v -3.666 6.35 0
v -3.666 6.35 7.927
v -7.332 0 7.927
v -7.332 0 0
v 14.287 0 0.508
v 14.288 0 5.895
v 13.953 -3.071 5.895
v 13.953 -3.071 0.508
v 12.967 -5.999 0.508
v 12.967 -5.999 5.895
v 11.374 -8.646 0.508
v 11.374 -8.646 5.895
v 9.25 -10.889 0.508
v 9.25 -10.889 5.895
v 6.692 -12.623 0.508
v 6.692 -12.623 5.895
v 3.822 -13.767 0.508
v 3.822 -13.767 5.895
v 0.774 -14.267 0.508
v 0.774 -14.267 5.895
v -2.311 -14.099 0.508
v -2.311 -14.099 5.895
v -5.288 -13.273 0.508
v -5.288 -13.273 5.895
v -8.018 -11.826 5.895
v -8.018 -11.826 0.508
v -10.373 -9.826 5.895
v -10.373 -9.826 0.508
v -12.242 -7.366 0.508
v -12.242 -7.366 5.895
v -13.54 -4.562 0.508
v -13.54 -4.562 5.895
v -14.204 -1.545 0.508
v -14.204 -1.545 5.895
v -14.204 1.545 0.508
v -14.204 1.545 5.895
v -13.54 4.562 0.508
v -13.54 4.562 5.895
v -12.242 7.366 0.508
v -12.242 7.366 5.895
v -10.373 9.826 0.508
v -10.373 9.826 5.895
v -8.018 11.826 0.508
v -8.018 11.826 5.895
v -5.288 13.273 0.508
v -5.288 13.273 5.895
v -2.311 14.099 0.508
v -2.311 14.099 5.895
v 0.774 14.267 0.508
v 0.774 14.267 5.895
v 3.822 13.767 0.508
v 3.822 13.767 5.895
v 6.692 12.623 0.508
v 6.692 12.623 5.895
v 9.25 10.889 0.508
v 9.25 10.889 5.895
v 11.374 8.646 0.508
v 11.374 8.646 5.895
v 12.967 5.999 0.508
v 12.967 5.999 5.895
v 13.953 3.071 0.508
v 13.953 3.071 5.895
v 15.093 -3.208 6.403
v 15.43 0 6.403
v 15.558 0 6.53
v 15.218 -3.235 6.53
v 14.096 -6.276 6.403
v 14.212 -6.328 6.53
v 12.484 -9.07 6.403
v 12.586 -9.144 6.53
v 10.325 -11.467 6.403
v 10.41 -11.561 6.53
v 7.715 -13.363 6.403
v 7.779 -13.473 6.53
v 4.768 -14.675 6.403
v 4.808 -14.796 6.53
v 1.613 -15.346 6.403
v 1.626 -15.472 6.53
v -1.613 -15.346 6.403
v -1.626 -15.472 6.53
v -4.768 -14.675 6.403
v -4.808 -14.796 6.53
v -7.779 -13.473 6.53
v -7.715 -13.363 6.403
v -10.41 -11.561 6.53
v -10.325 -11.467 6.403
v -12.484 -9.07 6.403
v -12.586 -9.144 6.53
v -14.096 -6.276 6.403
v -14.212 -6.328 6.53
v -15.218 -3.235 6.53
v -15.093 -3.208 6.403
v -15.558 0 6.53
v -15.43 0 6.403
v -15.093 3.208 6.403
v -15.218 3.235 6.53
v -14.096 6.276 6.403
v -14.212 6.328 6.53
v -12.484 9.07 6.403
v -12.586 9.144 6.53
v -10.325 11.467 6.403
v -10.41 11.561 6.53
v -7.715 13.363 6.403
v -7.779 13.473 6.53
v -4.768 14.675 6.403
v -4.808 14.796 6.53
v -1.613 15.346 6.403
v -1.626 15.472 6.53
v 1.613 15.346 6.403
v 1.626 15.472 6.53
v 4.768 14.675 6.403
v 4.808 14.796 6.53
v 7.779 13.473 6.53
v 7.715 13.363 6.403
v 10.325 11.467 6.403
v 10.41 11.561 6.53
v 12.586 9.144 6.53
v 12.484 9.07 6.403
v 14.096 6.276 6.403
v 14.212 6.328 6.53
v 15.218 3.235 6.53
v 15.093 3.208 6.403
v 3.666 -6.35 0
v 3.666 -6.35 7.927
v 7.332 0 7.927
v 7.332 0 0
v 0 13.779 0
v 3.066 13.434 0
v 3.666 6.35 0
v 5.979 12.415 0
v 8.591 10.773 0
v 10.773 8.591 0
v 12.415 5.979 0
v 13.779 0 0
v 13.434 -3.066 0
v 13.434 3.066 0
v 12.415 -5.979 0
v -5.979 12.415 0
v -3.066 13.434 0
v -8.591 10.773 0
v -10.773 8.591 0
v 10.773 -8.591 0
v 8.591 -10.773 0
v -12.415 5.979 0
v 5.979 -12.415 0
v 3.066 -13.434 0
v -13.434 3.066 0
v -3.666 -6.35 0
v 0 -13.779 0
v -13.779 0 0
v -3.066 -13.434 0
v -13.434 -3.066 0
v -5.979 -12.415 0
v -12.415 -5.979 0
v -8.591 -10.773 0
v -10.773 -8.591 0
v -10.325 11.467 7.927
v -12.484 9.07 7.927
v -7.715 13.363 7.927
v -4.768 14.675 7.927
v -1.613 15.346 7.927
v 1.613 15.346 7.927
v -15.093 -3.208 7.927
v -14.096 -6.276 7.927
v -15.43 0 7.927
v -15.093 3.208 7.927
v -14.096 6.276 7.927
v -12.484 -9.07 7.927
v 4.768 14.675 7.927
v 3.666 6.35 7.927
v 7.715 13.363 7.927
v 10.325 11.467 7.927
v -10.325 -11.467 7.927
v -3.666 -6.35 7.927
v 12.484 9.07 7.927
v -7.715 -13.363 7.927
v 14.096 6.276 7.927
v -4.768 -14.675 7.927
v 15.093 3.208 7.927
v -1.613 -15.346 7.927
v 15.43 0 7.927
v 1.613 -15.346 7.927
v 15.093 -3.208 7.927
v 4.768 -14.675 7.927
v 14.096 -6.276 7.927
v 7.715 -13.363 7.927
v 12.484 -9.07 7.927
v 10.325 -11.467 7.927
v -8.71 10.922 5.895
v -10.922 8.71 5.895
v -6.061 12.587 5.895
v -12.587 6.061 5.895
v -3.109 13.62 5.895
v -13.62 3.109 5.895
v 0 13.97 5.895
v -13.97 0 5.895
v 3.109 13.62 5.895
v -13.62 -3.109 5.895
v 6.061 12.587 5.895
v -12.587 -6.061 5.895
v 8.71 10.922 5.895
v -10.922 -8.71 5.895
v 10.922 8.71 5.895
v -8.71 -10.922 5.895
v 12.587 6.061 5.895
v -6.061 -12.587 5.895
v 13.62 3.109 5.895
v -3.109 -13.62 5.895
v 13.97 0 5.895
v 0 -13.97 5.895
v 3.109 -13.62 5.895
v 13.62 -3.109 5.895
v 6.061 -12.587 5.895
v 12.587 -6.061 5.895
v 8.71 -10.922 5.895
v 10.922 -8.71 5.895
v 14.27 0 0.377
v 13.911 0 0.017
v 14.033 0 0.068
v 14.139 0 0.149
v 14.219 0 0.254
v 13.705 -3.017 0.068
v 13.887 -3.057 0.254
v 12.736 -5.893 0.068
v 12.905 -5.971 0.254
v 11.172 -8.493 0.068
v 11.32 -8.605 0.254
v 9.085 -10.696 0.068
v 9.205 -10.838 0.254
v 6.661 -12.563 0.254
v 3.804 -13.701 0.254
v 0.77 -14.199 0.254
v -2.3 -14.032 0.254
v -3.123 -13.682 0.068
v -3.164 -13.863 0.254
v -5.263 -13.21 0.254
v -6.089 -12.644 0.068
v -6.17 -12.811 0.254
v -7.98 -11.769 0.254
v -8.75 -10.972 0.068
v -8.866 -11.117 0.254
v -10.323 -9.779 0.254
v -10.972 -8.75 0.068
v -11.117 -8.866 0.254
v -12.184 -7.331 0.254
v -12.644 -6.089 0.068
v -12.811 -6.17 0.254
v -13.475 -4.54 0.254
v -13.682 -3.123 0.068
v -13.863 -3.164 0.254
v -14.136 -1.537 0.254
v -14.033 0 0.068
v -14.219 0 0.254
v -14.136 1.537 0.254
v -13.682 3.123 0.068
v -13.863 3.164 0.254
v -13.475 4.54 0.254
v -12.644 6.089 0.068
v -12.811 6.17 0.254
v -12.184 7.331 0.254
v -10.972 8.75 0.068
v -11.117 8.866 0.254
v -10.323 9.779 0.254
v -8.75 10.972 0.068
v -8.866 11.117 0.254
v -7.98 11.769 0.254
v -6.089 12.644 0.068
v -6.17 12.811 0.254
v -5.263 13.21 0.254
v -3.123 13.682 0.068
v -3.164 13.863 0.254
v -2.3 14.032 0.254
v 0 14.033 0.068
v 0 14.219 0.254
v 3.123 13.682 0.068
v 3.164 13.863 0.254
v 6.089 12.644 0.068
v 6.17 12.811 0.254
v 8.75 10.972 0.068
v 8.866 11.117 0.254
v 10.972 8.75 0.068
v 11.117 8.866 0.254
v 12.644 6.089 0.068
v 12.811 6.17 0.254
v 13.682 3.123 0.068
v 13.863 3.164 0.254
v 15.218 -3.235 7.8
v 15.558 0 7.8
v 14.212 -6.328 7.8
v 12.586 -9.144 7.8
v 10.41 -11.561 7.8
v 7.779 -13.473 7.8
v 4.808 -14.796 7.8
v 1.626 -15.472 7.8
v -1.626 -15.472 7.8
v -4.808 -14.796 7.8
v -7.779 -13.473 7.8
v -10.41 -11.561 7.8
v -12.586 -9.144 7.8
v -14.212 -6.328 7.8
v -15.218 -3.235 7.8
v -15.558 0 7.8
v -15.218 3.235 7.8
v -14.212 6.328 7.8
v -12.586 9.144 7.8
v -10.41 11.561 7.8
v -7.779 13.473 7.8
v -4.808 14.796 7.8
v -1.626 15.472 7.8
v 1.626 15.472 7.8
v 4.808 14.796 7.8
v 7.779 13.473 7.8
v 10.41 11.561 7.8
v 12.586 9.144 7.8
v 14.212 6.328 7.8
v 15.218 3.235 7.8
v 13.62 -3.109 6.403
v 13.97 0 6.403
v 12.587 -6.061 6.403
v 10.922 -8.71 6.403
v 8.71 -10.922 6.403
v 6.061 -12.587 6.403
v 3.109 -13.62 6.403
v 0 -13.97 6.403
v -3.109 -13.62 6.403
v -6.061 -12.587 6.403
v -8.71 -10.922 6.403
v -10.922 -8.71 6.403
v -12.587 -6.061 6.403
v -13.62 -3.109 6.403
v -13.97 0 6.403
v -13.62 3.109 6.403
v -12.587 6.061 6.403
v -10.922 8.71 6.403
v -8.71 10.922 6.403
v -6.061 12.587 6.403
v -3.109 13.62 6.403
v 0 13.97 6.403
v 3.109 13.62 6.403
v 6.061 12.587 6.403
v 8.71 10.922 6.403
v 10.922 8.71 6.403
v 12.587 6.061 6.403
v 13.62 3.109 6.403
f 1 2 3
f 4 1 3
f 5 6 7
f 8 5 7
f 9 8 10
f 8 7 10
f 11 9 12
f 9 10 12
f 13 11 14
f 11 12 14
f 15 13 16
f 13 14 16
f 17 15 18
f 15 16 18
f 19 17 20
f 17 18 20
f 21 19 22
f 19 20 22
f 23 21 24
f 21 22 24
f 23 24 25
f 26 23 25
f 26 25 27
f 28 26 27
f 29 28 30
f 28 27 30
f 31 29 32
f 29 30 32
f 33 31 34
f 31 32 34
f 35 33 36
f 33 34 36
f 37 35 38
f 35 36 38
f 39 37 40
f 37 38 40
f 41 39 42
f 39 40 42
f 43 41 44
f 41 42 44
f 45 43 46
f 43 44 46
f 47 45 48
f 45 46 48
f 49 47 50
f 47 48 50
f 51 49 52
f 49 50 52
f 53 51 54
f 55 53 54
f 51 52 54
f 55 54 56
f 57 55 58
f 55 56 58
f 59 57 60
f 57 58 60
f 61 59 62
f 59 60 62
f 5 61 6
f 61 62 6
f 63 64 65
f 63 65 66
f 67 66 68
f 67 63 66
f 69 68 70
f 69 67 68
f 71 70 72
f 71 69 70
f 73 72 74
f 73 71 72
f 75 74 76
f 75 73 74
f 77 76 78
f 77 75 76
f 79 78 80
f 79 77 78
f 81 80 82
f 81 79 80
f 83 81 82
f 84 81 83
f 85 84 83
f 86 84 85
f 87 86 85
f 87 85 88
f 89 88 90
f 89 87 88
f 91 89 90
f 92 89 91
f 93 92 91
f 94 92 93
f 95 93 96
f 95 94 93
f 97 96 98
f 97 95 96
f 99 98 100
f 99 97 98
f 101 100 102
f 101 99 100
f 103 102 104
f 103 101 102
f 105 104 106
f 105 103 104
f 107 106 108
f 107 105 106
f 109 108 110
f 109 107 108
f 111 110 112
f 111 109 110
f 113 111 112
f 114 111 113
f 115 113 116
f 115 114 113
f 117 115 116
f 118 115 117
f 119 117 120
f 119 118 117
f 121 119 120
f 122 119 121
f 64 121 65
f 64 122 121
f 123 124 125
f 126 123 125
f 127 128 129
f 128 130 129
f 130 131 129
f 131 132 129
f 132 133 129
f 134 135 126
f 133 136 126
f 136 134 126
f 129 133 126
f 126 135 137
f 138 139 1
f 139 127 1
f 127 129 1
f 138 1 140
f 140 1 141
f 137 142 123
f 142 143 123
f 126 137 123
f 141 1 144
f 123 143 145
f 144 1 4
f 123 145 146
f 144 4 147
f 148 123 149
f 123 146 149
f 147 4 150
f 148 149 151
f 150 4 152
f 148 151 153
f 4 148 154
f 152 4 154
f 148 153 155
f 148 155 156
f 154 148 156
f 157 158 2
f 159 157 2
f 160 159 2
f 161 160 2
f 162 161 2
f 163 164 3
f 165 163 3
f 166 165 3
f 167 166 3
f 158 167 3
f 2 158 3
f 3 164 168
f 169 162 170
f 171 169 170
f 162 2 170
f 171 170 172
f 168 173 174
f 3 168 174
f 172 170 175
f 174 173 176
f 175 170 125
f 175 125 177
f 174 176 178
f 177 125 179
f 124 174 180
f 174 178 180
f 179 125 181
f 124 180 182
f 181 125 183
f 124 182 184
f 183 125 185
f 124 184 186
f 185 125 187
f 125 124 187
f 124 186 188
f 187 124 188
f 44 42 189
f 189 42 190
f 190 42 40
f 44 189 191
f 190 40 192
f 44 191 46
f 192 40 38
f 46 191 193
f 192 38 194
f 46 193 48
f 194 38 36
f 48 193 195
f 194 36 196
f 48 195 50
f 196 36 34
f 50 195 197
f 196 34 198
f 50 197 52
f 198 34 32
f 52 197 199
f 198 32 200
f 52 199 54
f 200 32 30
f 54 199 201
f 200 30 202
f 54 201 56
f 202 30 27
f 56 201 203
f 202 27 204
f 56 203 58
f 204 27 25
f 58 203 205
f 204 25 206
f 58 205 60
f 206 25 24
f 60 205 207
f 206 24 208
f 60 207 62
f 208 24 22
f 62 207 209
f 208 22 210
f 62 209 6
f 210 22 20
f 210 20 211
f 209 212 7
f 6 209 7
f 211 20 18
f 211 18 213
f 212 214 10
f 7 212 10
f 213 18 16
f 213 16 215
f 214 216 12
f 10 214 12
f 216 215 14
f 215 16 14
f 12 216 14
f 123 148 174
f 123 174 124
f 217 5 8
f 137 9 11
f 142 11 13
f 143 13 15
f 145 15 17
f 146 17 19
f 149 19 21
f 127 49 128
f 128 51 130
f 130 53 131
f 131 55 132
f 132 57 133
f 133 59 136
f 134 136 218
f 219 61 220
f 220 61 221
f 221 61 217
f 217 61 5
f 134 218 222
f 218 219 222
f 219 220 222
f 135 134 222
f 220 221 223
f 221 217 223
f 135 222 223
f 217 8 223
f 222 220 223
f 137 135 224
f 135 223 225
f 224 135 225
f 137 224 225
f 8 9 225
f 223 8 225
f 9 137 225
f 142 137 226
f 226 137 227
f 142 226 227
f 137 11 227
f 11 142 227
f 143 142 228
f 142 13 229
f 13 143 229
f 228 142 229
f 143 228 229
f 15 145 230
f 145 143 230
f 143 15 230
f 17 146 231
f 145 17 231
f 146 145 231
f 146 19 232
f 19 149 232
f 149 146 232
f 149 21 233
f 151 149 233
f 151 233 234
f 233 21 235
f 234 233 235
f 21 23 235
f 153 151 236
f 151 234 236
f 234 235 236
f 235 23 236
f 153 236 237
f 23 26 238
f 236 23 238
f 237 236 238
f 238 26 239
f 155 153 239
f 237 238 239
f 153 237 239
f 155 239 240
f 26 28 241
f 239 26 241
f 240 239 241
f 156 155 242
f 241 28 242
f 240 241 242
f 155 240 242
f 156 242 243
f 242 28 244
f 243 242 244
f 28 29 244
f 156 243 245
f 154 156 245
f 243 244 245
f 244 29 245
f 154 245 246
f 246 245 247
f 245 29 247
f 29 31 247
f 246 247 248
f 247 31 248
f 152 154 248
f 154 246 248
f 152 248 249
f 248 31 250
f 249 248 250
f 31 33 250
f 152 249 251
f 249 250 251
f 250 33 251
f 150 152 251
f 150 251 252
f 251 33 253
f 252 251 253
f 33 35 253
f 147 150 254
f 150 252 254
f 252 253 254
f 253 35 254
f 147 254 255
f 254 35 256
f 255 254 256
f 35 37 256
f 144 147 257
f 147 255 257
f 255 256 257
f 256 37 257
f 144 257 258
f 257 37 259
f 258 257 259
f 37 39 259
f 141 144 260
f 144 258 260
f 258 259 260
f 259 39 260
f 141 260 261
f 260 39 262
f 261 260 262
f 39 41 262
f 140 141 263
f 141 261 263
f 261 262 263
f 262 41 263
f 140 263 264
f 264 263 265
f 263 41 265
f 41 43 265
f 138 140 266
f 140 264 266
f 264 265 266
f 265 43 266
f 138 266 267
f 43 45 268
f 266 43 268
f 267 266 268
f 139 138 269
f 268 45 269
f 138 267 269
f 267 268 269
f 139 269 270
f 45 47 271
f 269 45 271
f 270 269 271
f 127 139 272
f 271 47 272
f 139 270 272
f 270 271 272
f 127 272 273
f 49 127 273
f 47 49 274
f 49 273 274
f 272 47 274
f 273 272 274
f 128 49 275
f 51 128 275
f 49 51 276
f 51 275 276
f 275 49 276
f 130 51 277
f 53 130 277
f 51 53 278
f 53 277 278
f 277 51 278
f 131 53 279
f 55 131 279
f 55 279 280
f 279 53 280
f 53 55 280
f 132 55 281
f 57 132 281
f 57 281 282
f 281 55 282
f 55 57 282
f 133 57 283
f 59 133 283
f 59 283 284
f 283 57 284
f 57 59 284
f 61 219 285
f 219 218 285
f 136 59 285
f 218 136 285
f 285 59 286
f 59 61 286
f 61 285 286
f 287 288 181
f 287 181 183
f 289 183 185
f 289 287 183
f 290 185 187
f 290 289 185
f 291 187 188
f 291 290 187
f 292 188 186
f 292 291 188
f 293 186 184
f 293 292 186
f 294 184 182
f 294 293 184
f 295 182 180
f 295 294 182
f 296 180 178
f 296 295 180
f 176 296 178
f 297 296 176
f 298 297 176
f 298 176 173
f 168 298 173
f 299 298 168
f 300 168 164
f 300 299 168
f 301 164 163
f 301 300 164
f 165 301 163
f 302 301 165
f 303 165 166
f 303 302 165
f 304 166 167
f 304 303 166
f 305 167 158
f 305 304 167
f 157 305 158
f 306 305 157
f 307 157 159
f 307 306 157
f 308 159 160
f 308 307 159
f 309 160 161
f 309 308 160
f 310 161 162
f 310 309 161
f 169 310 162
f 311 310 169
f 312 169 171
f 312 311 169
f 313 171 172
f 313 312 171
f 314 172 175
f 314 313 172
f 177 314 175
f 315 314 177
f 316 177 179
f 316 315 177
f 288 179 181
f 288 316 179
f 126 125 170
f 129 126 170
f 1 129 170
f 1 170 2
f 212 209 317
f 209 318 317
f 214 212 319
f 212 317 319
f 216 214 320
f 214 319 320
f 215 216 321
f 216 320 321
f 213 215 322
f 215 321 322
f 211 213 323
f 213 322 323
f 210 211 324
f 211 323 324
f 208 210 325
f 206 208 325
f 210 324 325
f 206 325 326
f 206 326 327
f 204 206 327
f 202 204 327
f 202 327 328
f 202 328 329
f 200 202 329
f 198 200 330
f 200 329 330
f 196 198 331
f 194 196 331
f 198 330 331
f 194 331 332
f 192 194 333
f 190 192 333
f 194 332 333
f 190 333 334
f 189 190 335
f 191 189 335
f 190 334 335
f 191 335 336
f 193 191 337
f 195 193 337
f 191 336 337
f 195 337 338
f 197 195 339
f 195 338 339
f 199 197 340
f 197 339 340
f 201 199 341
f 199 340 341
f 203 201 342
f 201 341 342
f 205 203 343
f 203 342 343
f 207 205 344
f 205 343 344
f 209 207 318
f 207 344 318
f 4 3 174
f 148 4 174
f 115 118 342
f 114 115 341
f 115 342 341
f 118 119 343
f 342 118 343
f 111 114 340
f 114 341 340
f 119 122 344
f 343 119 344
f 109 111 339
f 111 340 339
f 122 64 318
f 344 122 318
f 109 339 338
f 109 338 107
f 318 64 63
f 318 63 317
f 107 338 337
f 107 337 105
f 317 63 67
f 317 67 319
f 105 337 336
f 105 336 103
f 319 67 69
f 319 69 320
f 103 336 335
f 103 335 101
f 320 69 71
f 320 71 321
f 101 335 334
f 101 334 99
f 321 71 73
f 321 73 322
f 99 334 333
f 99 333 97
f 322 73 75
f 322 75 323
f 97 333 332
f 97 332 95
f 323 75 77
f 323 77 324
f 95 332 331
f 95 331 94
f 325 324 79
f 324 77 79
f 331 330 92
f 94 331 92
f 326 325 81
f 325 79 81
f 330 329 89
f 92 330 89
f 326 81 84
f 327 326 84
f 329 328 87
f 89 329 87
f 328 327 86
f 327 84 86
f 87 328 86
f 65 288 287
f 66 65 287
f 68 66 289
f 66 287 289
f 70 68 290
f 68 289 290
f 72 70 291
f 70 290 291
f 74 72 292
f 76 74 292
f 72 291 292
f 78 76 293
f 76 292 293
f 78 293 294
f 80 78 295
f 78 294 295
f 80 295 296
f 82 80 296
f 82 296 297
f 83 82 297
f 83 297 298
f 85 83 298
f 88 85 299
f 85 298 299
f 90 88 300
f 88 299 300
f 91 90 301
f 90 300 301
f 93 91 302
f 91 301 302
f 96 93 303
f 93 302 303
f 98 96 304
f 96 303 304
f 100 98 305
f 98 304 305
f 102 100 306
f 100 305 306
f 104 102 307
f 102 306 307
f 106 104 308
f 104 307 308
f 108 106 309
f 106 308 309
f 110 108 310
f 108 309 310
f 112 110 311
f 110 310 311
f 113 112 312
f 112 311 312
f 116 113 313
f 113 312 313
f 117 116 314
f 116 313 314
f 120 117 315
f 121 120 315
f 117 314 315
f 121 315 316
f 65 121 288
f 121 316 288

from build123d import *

# Parameters (mm, degrees)
CUT_EXTRUDE1_DEPTH = 8.92734
CHAMFER1_SIZE      = 0.127
FILLET1_R          = 0.508


with BuildPart() as part:
    # Sketch1 → Revolve1 (revolve)
    with BuildSketch(Plane.XZ):
        Polygon((15.5575, 7.92734), (0, 7.92734), (0, 0), (14.2875, 0), (14.2875, 5.89534), (13.97, 5.89534), (13.97, 6.40334), (15.5575, 6.40334), align=None)
    revolve(axis=Axis((0, 0, 7.92734), (0, 0, -1)))

    # Sketch2 → Cut-Extrude1 (cut, through all)
    with BuildSketch(Plane.XY.offset(7.92734)):
        Polygon((7.332348419, 0), (3.666174209, 6.35), (-3.666174209, 6.35), (-7.332348419, 0), (-3.666174209, -6.35), (3.666174209, -6.35), align=None)
    extrude(amount=-CUT_EXTRUDE1_DEPTH, mode=Mode.SUBTRACT)

    # Chamfer1
    chamfer1_edges = [part.edges().sort_by_distance(p)[0] for p in [
        (-15.5575, 0, 6.40334),
        (-15.5575, 0, 7.92734),
    ]]
    chamfer(chamfer1_edges, length=CHAMFER1_SIZE)

    # Fillet1
    fillet1_edges = [part.edges().sort_by_distance(p)[0] for p in [
        (-14.2875, 0, 0),
    ]]
    fillet(fillet1_edges, radius=FILLET1_R)


solid = part.part
